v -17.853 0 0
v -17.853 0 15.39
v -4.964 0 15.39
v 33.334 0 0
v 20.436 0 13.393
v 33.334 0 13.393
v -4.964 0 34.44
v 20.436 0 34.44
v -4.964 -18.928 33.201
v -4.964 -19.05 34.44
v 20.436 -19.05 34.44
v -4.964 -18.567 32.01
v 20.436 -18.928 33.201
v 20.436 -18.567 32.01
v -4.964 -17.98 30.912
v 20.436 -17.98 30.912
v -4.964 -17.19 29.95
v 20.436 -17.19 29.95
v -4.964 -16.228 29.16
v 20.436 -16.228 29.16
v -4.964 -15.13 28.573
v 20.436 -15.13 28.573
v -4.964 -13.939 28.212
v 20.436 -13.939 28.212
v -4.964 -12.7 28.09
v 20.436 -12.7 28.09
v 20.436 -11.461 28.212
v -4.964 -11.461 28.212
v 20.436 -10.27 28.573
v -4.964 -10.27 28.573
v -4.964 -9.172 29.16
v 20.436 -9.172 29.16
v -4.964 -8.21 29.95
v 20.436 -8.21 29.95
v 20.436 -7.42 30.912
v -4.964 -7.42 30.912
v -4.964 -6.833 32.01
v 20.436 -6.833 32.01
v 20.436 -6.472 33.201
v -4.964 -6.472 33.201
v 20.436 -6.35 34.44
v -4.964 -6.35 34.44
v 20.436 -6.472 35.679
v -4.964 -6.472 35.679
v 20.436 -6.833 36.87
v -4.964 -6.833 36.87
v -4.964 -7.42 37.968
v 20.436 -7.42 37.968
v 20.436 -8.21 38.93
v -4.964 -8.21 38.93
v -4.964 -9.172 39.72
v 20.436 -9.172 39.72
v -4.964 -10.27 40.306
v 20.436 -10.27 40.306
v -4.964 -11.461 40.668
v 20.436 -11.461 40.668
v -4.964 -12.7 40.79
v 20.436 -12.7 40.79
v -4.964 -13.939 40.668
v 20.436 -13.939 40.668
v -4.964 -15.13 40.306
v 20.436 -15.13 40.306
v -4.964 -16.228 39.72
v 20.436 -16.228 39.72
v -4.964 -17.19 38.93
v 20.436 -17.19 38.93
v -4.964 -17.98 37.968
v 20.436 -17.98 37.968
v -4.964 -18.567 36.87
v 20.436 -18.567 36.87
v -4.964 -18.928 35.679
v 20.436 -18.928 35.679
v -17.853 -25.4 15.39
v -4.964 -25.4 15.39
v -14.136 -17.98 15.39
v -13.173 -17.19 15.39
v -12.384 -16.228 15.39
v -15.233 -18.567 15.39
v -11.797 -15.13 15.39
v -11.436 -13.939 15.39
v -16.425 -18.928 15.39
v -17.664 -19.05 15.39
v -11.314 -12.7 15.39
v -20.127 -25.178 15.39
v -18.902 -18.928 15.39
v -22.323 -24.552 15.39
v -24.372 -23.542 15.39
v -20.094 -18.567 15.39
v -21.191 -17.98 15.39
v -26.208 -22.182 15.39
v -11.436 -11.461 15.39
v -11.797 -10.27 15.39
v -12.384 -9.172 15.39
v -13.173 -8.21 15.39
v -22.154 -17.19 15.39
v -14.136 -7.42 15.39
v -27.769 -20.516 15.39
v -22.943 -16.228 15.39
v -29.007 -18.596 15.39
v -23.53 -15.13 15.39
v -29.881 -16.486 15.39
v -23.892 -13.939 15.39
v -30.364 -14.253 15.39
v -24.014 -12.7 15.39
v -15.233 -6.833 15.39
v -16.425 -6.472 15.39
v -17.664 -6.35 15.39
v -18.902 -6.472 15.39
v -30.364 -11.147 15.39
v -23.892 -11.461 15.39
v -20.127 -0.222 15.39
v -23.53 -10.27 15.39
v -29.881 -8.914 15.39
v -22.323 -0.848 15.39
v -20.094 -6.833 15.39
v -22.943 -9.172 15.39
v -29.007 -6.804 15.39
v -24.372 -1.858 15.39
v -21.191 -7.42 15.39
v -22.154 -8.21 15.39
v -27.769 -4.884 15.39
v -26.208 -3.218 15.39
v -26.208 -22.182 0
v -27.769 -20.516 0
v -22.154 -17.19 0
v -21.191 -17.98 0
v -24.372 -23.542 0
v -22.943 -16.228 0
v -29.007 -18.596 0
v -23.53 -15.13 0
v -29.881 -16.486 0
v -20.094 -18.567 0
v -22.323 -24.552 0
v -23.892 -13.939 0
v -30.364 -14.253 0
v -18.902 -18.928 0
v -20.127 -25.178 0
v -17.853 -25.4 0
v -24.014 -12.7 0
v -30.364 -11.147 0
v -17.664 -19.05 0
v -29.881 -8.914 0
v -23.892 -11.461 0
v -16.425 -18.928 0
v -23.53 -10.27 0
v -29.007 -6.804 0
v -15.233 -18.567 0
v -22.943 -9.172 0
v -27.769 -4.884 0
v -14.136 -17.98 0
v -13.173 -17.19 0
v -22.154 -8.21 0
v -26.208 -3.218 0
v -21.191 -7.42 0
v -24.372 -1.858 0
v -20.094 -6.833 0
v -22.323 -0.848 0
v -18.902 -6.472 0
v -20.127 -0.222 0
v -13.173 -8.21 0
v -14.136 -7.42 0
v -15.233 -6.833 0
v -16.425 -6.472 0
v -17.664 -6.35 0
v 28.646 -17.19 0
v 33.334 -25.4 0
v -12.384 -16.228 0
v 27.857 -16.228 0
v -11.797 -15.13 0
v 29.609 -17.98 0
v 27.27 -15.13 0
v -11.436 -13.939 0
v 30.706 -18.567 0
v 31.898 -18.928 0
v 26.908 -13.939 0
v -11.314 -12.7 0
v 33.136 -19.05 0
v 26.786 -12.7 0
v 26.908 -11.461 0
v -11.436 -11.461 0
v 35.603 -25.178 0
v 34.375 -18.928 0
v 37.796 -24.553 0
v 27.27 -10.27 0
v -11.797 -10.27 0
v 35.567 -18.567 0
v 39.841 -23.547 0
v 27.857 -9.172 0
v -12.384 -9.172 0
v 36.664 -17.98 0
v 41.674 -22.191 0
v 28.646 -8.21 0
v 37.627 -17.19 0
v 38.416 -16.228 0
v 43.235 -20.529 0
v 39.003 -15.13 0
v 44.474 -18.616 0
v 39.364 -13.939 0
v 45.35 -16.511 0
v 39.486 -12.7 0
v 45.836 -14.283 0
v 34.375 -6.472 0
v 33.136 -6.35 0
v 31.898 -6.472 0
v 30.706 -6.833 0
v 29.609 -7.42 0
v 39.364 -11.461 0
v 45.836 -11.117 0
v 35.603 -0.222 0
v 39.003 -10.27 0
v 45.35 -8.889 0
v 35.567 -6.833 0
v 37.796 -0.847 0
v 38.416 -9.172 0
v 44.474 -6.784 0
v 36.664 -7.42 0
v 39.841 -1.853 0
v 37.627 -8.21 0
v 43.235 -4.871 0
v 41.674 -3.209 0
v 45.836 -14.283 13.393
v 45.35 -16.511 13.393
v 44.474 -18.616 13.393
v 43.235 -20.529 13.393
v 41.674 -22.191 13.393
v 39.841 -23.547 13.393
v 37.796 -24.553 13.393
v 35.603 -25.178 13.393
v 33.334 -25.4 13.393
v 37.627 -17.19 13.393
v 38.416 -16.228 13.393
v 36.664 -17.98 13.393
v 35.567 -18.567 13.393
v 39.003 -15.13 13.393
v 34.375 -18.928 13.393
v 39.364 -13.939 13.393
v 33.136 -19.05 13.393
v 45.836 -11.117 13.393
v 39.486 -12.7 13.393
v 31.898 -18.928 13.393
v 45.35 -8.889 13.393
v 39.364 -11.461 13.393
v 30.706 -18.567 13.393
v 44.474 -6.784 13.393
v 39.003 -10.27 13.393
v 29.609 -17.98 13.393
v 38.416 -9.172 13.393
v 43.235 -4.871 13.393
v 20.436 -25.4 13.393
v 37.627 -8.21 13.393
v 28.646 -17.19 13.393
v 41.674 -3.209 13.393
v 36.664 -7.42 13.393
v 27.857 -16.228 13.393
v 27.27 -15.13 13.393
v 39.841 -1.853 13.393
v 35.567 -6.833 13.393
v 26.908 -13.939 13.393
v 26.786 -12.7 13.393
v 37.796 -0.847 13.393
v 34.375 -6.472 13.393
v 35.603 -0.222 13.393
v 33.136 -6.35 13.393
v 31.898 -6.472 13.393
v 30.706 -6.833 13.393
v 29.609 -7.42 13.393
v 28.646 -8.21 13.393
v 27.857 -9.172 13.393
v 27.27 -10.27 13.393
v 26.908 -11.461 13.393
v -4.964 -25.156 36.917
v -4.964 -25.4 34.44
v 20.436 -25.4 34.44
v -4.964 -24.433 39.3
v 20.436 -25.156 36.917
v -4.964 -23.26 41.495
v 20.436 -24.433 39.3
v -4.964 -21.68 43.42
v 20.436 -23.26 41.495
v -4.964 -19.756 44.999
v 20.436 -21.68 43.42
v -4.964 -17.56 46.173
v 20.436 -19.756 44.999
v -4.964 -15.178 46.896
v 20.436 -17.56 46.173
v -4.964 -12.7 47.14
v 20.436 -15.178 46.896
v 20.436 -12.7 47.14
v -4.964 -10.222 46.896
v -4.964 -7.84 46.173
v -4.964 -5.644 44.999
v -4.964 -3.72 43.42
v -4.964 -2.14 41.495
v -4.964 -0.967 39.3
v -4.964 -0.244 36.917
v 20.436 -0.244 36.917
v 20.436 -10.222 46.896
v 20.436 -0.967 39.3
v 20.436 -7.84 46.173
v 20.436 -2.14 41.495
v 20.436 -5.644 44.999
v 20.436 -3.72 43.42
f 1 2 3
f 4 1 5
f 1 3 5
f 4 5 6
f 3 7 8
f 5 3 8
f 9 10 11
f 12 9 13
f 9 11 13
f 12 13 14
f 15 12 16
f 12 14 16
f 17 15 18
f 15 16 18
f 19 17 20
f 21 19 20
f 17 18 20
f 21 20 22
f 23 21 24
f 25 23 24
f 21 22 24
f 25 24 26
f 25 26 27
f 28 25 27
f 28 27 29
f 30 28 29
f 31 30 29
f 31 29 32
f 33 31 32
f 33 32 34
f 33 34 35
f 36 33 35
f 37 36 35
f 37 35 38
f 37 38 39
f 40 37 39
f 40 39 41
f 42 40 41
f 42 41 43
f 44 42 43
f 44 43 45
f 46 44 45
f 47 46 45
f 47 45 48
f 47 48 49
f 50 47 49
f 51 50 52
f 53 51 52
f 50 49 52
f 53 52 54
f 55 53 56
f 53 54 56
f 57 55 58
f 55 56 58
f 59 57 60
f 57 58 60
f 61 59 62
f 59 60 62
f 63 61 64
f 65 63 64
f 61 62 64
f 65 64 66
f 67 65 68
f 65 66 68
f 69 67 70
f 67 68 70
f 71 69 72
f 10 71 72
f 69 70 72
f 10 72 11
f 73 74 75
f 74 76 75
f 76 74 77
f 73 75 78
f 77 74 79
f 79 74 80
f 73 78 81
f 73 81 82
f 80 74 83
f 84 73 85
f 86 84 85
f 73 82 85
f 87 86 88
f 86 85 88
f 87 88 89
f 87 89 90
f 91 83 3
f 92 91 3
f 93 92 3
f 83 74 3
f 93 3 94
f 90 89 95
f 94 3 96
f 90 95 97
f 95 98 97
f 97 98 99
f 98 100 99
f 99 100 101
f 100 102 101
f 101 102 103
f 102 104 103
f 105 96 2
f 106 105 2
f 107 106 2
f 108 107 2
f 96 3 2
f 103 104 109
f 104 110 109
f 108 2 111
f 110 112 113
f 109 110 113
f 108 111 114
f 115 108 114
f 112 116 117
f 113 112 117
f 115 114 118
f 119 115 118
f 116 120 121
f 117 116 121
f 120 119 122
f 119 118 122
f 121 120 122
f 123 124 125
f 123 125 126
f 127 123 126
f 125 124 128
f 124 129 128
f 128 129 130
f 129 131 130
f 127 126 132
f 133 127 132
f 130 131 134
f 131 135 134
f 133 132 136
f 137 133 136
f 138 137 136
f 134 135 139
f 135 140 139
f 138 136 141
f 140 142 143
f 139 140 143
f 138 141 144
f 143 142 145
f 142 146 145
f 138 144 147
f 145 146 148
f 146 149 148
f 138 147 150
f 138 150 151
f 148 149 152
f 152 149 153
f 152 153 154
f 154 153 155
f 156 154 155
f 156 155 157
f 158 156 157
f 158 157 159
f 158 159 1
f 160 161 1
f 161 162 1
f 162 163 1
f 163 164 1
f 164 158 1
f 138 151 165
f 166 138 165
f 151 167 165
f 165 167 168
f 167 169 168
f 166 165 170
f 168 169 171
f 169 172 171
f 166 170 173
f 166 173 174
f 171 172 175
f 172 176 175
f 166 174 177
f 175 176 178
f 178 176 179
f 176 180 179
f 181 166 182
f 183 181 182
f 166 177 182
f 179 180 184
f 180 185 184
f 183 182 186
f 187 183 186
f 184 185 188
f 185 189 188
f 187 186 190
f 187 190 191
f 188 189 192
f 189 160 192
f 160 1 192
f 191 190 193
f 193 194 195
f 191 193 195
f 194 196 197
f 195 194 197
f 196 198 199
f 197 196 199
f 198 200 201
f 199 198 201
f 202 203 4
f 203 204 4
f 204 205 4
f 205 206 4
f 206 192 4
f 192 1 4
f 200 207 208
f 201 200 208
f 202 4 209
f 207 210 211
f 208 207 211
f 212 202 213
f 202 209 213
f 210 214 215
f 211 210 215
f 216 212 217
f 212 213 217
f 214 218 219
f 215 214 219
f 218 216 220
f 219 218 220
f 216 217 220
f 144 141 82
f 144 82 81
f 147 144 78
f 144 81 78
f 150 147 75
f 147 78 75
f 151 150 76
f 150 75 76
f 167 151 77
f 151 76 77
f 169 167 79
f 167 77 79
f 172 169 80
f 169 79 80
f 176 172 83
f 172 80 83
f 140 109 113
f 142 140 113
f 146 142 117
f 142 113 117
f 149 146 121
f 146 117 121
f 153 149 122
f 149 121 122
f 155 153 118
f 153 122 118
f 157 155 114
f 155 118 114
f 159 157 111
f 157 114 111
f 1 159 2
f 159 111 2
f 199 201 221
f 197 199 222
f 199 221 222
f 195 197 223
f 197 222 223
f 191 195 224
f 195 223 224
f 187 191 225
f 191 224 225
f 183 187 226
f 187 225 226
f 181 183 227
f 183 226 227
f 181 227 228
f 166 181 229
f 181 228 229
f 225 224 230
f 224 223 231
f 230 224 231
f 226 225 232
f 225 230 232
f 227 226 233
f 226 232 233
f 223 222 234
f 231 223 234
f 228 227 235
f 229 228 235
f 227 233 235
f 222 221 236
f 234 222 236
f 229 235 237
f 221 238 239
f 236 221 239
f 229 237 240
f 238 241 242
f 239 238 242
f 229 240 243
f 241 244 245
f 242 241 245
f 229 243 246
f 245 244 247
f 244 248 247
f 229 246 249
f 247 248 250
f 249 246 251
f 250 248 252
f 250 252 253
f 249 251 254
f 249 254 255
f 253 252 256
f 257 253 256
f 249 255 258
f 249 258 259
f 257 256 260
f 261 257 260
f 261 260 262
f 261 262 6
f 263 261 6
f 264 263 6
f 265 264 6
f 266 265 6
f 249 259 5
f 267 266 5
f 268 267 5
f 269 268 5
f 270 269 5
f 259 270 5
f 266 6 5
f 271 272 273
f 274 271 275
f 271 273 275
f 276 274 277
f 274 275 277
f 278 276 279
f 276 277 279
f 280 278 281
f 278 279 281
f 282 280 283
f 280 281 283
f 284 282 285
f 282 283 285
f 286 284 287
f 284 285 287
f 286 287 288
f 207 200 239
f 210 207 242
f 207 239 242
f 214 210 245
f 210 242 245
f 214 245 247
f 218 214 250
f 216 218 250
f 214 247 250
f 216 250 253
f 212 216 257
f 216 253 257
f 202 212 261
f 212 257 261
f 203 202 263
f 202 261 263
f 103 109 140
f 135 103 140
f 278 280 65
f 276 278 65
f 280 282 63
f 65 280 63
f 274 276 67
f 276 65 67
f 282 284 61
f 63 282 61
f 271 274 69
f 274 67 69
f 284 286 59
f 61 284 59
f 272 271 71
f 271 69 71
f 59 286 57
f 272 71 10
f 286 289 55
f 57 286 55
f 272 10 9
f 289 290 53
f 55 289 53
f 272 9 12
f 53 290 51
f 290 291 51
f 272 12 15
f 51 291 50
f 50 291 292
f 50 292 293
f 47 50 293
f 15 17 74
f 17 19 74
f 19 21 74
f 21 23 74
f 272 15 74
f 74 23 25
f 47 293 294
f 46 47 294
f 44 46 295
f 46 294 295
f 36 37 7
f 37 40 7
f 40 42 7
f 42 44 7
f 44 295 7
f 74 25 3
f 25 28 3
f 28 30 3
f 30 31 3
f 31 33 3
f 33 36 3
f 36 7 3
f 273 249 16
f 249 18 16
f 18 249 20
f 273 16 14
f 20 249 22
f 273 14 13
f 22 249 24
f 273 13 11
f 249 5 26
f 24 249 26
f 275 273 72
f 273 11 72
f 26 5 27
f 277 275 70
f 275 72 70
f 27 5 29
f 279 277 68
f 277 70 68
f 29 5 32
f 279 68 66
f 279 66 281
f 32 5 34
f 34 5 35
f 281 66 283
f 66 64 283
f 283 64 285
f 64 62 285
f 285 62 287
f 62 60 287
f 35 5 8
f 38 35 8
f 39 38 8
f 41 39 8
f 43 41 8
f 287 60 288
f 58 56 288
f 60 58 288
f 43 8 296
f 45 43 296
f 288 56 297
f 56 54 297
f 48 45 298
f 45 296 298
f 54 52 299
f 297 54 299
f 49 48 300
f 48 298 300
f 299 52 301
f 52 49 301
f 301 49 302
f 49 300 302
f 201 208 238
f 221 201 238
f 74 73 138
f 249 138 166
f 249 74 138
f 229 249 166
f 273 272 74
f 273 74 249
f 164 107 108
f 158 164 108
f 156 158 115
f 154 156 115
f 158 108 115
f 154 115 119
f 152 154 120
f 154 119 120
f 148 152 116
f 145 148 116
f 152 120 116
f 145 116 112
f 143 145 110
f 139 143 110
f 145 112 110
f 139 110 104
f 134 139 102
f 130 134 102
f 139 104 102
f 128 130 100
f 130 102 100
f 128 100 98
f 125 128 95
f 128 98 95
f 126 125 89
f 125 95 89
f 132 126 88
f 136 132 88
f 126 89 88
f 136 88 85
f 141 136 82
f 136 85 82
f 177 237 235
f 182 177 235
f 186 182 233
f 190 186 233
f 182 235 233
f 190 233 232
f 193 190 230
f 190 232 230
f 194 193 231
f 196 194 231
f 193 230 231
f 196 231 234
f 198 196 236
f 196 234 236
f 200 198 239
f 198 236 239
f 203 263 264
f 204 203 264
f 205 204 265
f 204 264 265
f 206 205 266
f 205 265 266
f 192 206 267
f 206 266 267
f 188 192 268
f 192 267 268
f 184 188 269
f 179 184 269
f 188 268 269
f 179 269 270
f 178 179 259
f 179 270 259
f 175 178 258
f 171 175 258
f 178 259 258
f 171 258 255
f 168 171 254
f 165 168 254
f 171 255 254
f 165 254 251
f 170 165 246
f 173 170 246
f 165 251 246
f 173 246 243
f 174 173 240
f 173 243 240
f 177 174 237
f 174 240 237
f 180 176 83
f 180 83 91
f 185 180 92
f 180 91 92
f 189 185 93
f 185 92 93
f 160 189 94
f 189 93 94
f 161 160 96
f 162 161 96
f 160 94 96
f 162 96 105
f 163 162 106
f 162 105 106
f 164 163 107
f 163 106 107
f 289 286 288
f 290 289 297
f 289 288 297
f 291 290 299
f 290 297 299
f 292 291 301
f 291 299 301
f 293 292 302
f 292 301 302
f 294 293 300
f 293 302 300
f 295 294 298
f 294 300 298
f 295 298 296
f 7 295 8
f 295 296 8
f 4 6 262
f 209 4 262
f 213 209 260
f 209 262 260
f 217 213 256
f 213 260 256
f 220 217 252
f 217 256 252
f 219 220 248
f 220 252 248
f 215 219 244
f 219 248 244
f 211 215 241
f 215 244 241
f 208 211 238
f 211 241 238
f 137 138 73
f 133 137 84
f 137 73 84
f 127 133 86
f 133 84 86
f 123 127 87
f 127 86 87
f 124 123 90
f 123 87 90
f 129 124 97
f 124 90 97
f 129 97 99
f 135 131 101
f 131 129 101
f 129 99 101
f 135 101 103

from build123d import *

# Parameters (mm, degrees)
F1_DEPTH = 25.4
F3_DEPTH = 50.801
F5_DEPTH = 13.394231155
F7_DEPTH = 15.3907378061


with BuildPart() as f1:
    # F0 (on Front) → F1 (new body)
    with BuildSketch(Plane.XZ):
        Polygon((-30.3635369193, 15.3897378061), (-30.3635369193, 0), (45.8364630807, 0), (45.8364630807, 13.393231155), (20.4364630807, 13.393231155), (20.4364630807, 47.1397378061), (-4.9635369193, 47.1397378061), (-4.9635369193, 15.3897378061), align=None)
    extrude(amount=F1_DEPTH)

    # F2 (on face) → F3 (cut, through all)
    with BuildSketch(Plane.YZ.offset(20.4364630807)):
        with BuildLine():
            Line((-19.05, 34.4397378061), (-6.35, 34.4397378061))
            ThreePointArc((-6.35, 34.4397378061), (-12.7, 40.7897378061), (-19.05, 34.4397378061))
        make_face()
        with BuildLine():
            ThreePointArc((-25.4, 34.4397378061), (-21.6802561211, 43.4199939272), (-12.7, 47.1397378061))
            Line((-12.7, 47.1397378061), (-25.4, 47.1397378061))
            Line((-25.4, 47.1397378061), (-25.4, 34.4397378061))
        make_face()
        with BuildLine():
            ThreePointArc((-12.7, 47.1397378061), (-3.7197438789, 43.4199939272), (0, 34.4397378061))
            Line((0, 34.4397378061), (0, 47.1397378061))
            Line((0, 47.1397378061), (-12.7, 47.1397378061))
        make_face()
        with BuildLine():
            ThreePointArc((-19.05, 34.4397378061), (-12.7, 28.0897378061), (-6.35, 34.4397378061))
            Line((-6.35, 34.4397378061), (-19.05, 34.4397378061))
        make_face()
    extrude(amount=-F3_DEPTH, mode=Mode.SUBTRACT)

    # F4 (on face) → F5 (cut, through all)
    with BuildSketch(Plane.XY.offset(13.393231155)):
        with BuildLine():
            ThreePointArc((39.4864630807, -12.7), (37.6265911412, -8.2098719395), (33.1364630807, -6.35))
            Line((33.1364630807, -6.35), (33.1364630807, -19.05))
            ThreePointArc((33.1364630807, -19.05), (37.6265911412, -17.1901280605), (39.4864630807, -12.7))
        make_face()
        with BuildLine():
            Line((33.1364630807, -19.05), (33.1364630807, -6.35))
            ThreePointArc((33.1364630807, -6.35), (26.7864630807, -12.7), (33.1364630807, -19.05))
        make_face()
        with BuildLine():
            Line((45.8364630807, 0), (33.33389133, 0))
            ThreePointArc((33.33389133, 0), (41.6741864681, -3.2088005425), (45.8364630807, -11.1165421488))
            Line((45.8364630807, -11.1165421488), (45.8364630807, 0))
        make_face()
        with BuildLine():
            ThreePointArc((45.8364630807, -14.2834578512), (45.9355608404, -12.7), (45.8364630807, -11.1165421488))
            Line((45.8364630807, -11.1165421488), (45.8364630807, -14.2834578512))
        make_face()
        with BuildLine():
            Line((45.8364630807, -25.4), (45.8364630807, -14.2834578512))
            ThreePointArc((45.8364630807, -14.2834578512), (41.6741864681, -22.1911994575), (33.33389133, -25.4))
            Line((33.33389133, -25.4), (45.8364630807, -25.4))
        make_face()
    extrude(amount=-F5_DEPTH, mode=Mode.SUBTRACT)

    # F6 (on face) → F7 (cut, through all)
    with BuildSketch(Plane.XY.offset(15.3897378061)):
        with BuildLine():
            ThreePointArc((-11.3135369193, -12.7), (-13.1734088588, -8.2098719395), (-17.6635369193, -6.35))
            Line((-17.6635369193, -6.35), (-17.6635369193, -19.05))
            ThreePointArc((-17.6635369193, -19.05), (-13.1734088588, -17.1901280605), (-11.3135369193, -12.7))
        make_face()
        with BuildLine():
            Line((-17.6635369193, -19.05), (-17.6635369193, -6.35))
            ThreePointArc((-17.6635369193, -6.35), (-24.0135369193, -12.7), (-17.6635369193, -19.05))
        make_face()
        with BuildLine():
            ThreePointArc((-30.3635369193, -11.1468519042), (-26.2075067106, -3.2177300877), (-17.8534793608, 0))
            Line((-17.8534793608, 0), (-30.3635369193, 0))
            Line((-30.3635369193, 0), (-30.3635369193, -11.1468519042))
        make_face()
        with BuildLine():
            Line((-30.3635369193, -14.2531480958), (-30.3635369193, -11.1468519042))
            ThreePointArc((-30.3635369193, -11.1468519042), (-30.4588632348, -12.7), (-30.3635369193, -14.2531480958))
        make_face()
        with BuildLine():
            ThreePointArc((-17.8534793608, -25.4), (-26.2075067106, -22.1822699123), (-30.3635369193, -14.2531480958))
            Line((-30.3635369193, -14.2531480958), (-30.3635369193, -25.4))
            Line((-30.3635369193, -25.4), (-17.8534793608, -25.4))
        make_face()
    extrude(amount=-F7_DEPTH, mode=Mode.SUBTRACT)


solid = f1.part
